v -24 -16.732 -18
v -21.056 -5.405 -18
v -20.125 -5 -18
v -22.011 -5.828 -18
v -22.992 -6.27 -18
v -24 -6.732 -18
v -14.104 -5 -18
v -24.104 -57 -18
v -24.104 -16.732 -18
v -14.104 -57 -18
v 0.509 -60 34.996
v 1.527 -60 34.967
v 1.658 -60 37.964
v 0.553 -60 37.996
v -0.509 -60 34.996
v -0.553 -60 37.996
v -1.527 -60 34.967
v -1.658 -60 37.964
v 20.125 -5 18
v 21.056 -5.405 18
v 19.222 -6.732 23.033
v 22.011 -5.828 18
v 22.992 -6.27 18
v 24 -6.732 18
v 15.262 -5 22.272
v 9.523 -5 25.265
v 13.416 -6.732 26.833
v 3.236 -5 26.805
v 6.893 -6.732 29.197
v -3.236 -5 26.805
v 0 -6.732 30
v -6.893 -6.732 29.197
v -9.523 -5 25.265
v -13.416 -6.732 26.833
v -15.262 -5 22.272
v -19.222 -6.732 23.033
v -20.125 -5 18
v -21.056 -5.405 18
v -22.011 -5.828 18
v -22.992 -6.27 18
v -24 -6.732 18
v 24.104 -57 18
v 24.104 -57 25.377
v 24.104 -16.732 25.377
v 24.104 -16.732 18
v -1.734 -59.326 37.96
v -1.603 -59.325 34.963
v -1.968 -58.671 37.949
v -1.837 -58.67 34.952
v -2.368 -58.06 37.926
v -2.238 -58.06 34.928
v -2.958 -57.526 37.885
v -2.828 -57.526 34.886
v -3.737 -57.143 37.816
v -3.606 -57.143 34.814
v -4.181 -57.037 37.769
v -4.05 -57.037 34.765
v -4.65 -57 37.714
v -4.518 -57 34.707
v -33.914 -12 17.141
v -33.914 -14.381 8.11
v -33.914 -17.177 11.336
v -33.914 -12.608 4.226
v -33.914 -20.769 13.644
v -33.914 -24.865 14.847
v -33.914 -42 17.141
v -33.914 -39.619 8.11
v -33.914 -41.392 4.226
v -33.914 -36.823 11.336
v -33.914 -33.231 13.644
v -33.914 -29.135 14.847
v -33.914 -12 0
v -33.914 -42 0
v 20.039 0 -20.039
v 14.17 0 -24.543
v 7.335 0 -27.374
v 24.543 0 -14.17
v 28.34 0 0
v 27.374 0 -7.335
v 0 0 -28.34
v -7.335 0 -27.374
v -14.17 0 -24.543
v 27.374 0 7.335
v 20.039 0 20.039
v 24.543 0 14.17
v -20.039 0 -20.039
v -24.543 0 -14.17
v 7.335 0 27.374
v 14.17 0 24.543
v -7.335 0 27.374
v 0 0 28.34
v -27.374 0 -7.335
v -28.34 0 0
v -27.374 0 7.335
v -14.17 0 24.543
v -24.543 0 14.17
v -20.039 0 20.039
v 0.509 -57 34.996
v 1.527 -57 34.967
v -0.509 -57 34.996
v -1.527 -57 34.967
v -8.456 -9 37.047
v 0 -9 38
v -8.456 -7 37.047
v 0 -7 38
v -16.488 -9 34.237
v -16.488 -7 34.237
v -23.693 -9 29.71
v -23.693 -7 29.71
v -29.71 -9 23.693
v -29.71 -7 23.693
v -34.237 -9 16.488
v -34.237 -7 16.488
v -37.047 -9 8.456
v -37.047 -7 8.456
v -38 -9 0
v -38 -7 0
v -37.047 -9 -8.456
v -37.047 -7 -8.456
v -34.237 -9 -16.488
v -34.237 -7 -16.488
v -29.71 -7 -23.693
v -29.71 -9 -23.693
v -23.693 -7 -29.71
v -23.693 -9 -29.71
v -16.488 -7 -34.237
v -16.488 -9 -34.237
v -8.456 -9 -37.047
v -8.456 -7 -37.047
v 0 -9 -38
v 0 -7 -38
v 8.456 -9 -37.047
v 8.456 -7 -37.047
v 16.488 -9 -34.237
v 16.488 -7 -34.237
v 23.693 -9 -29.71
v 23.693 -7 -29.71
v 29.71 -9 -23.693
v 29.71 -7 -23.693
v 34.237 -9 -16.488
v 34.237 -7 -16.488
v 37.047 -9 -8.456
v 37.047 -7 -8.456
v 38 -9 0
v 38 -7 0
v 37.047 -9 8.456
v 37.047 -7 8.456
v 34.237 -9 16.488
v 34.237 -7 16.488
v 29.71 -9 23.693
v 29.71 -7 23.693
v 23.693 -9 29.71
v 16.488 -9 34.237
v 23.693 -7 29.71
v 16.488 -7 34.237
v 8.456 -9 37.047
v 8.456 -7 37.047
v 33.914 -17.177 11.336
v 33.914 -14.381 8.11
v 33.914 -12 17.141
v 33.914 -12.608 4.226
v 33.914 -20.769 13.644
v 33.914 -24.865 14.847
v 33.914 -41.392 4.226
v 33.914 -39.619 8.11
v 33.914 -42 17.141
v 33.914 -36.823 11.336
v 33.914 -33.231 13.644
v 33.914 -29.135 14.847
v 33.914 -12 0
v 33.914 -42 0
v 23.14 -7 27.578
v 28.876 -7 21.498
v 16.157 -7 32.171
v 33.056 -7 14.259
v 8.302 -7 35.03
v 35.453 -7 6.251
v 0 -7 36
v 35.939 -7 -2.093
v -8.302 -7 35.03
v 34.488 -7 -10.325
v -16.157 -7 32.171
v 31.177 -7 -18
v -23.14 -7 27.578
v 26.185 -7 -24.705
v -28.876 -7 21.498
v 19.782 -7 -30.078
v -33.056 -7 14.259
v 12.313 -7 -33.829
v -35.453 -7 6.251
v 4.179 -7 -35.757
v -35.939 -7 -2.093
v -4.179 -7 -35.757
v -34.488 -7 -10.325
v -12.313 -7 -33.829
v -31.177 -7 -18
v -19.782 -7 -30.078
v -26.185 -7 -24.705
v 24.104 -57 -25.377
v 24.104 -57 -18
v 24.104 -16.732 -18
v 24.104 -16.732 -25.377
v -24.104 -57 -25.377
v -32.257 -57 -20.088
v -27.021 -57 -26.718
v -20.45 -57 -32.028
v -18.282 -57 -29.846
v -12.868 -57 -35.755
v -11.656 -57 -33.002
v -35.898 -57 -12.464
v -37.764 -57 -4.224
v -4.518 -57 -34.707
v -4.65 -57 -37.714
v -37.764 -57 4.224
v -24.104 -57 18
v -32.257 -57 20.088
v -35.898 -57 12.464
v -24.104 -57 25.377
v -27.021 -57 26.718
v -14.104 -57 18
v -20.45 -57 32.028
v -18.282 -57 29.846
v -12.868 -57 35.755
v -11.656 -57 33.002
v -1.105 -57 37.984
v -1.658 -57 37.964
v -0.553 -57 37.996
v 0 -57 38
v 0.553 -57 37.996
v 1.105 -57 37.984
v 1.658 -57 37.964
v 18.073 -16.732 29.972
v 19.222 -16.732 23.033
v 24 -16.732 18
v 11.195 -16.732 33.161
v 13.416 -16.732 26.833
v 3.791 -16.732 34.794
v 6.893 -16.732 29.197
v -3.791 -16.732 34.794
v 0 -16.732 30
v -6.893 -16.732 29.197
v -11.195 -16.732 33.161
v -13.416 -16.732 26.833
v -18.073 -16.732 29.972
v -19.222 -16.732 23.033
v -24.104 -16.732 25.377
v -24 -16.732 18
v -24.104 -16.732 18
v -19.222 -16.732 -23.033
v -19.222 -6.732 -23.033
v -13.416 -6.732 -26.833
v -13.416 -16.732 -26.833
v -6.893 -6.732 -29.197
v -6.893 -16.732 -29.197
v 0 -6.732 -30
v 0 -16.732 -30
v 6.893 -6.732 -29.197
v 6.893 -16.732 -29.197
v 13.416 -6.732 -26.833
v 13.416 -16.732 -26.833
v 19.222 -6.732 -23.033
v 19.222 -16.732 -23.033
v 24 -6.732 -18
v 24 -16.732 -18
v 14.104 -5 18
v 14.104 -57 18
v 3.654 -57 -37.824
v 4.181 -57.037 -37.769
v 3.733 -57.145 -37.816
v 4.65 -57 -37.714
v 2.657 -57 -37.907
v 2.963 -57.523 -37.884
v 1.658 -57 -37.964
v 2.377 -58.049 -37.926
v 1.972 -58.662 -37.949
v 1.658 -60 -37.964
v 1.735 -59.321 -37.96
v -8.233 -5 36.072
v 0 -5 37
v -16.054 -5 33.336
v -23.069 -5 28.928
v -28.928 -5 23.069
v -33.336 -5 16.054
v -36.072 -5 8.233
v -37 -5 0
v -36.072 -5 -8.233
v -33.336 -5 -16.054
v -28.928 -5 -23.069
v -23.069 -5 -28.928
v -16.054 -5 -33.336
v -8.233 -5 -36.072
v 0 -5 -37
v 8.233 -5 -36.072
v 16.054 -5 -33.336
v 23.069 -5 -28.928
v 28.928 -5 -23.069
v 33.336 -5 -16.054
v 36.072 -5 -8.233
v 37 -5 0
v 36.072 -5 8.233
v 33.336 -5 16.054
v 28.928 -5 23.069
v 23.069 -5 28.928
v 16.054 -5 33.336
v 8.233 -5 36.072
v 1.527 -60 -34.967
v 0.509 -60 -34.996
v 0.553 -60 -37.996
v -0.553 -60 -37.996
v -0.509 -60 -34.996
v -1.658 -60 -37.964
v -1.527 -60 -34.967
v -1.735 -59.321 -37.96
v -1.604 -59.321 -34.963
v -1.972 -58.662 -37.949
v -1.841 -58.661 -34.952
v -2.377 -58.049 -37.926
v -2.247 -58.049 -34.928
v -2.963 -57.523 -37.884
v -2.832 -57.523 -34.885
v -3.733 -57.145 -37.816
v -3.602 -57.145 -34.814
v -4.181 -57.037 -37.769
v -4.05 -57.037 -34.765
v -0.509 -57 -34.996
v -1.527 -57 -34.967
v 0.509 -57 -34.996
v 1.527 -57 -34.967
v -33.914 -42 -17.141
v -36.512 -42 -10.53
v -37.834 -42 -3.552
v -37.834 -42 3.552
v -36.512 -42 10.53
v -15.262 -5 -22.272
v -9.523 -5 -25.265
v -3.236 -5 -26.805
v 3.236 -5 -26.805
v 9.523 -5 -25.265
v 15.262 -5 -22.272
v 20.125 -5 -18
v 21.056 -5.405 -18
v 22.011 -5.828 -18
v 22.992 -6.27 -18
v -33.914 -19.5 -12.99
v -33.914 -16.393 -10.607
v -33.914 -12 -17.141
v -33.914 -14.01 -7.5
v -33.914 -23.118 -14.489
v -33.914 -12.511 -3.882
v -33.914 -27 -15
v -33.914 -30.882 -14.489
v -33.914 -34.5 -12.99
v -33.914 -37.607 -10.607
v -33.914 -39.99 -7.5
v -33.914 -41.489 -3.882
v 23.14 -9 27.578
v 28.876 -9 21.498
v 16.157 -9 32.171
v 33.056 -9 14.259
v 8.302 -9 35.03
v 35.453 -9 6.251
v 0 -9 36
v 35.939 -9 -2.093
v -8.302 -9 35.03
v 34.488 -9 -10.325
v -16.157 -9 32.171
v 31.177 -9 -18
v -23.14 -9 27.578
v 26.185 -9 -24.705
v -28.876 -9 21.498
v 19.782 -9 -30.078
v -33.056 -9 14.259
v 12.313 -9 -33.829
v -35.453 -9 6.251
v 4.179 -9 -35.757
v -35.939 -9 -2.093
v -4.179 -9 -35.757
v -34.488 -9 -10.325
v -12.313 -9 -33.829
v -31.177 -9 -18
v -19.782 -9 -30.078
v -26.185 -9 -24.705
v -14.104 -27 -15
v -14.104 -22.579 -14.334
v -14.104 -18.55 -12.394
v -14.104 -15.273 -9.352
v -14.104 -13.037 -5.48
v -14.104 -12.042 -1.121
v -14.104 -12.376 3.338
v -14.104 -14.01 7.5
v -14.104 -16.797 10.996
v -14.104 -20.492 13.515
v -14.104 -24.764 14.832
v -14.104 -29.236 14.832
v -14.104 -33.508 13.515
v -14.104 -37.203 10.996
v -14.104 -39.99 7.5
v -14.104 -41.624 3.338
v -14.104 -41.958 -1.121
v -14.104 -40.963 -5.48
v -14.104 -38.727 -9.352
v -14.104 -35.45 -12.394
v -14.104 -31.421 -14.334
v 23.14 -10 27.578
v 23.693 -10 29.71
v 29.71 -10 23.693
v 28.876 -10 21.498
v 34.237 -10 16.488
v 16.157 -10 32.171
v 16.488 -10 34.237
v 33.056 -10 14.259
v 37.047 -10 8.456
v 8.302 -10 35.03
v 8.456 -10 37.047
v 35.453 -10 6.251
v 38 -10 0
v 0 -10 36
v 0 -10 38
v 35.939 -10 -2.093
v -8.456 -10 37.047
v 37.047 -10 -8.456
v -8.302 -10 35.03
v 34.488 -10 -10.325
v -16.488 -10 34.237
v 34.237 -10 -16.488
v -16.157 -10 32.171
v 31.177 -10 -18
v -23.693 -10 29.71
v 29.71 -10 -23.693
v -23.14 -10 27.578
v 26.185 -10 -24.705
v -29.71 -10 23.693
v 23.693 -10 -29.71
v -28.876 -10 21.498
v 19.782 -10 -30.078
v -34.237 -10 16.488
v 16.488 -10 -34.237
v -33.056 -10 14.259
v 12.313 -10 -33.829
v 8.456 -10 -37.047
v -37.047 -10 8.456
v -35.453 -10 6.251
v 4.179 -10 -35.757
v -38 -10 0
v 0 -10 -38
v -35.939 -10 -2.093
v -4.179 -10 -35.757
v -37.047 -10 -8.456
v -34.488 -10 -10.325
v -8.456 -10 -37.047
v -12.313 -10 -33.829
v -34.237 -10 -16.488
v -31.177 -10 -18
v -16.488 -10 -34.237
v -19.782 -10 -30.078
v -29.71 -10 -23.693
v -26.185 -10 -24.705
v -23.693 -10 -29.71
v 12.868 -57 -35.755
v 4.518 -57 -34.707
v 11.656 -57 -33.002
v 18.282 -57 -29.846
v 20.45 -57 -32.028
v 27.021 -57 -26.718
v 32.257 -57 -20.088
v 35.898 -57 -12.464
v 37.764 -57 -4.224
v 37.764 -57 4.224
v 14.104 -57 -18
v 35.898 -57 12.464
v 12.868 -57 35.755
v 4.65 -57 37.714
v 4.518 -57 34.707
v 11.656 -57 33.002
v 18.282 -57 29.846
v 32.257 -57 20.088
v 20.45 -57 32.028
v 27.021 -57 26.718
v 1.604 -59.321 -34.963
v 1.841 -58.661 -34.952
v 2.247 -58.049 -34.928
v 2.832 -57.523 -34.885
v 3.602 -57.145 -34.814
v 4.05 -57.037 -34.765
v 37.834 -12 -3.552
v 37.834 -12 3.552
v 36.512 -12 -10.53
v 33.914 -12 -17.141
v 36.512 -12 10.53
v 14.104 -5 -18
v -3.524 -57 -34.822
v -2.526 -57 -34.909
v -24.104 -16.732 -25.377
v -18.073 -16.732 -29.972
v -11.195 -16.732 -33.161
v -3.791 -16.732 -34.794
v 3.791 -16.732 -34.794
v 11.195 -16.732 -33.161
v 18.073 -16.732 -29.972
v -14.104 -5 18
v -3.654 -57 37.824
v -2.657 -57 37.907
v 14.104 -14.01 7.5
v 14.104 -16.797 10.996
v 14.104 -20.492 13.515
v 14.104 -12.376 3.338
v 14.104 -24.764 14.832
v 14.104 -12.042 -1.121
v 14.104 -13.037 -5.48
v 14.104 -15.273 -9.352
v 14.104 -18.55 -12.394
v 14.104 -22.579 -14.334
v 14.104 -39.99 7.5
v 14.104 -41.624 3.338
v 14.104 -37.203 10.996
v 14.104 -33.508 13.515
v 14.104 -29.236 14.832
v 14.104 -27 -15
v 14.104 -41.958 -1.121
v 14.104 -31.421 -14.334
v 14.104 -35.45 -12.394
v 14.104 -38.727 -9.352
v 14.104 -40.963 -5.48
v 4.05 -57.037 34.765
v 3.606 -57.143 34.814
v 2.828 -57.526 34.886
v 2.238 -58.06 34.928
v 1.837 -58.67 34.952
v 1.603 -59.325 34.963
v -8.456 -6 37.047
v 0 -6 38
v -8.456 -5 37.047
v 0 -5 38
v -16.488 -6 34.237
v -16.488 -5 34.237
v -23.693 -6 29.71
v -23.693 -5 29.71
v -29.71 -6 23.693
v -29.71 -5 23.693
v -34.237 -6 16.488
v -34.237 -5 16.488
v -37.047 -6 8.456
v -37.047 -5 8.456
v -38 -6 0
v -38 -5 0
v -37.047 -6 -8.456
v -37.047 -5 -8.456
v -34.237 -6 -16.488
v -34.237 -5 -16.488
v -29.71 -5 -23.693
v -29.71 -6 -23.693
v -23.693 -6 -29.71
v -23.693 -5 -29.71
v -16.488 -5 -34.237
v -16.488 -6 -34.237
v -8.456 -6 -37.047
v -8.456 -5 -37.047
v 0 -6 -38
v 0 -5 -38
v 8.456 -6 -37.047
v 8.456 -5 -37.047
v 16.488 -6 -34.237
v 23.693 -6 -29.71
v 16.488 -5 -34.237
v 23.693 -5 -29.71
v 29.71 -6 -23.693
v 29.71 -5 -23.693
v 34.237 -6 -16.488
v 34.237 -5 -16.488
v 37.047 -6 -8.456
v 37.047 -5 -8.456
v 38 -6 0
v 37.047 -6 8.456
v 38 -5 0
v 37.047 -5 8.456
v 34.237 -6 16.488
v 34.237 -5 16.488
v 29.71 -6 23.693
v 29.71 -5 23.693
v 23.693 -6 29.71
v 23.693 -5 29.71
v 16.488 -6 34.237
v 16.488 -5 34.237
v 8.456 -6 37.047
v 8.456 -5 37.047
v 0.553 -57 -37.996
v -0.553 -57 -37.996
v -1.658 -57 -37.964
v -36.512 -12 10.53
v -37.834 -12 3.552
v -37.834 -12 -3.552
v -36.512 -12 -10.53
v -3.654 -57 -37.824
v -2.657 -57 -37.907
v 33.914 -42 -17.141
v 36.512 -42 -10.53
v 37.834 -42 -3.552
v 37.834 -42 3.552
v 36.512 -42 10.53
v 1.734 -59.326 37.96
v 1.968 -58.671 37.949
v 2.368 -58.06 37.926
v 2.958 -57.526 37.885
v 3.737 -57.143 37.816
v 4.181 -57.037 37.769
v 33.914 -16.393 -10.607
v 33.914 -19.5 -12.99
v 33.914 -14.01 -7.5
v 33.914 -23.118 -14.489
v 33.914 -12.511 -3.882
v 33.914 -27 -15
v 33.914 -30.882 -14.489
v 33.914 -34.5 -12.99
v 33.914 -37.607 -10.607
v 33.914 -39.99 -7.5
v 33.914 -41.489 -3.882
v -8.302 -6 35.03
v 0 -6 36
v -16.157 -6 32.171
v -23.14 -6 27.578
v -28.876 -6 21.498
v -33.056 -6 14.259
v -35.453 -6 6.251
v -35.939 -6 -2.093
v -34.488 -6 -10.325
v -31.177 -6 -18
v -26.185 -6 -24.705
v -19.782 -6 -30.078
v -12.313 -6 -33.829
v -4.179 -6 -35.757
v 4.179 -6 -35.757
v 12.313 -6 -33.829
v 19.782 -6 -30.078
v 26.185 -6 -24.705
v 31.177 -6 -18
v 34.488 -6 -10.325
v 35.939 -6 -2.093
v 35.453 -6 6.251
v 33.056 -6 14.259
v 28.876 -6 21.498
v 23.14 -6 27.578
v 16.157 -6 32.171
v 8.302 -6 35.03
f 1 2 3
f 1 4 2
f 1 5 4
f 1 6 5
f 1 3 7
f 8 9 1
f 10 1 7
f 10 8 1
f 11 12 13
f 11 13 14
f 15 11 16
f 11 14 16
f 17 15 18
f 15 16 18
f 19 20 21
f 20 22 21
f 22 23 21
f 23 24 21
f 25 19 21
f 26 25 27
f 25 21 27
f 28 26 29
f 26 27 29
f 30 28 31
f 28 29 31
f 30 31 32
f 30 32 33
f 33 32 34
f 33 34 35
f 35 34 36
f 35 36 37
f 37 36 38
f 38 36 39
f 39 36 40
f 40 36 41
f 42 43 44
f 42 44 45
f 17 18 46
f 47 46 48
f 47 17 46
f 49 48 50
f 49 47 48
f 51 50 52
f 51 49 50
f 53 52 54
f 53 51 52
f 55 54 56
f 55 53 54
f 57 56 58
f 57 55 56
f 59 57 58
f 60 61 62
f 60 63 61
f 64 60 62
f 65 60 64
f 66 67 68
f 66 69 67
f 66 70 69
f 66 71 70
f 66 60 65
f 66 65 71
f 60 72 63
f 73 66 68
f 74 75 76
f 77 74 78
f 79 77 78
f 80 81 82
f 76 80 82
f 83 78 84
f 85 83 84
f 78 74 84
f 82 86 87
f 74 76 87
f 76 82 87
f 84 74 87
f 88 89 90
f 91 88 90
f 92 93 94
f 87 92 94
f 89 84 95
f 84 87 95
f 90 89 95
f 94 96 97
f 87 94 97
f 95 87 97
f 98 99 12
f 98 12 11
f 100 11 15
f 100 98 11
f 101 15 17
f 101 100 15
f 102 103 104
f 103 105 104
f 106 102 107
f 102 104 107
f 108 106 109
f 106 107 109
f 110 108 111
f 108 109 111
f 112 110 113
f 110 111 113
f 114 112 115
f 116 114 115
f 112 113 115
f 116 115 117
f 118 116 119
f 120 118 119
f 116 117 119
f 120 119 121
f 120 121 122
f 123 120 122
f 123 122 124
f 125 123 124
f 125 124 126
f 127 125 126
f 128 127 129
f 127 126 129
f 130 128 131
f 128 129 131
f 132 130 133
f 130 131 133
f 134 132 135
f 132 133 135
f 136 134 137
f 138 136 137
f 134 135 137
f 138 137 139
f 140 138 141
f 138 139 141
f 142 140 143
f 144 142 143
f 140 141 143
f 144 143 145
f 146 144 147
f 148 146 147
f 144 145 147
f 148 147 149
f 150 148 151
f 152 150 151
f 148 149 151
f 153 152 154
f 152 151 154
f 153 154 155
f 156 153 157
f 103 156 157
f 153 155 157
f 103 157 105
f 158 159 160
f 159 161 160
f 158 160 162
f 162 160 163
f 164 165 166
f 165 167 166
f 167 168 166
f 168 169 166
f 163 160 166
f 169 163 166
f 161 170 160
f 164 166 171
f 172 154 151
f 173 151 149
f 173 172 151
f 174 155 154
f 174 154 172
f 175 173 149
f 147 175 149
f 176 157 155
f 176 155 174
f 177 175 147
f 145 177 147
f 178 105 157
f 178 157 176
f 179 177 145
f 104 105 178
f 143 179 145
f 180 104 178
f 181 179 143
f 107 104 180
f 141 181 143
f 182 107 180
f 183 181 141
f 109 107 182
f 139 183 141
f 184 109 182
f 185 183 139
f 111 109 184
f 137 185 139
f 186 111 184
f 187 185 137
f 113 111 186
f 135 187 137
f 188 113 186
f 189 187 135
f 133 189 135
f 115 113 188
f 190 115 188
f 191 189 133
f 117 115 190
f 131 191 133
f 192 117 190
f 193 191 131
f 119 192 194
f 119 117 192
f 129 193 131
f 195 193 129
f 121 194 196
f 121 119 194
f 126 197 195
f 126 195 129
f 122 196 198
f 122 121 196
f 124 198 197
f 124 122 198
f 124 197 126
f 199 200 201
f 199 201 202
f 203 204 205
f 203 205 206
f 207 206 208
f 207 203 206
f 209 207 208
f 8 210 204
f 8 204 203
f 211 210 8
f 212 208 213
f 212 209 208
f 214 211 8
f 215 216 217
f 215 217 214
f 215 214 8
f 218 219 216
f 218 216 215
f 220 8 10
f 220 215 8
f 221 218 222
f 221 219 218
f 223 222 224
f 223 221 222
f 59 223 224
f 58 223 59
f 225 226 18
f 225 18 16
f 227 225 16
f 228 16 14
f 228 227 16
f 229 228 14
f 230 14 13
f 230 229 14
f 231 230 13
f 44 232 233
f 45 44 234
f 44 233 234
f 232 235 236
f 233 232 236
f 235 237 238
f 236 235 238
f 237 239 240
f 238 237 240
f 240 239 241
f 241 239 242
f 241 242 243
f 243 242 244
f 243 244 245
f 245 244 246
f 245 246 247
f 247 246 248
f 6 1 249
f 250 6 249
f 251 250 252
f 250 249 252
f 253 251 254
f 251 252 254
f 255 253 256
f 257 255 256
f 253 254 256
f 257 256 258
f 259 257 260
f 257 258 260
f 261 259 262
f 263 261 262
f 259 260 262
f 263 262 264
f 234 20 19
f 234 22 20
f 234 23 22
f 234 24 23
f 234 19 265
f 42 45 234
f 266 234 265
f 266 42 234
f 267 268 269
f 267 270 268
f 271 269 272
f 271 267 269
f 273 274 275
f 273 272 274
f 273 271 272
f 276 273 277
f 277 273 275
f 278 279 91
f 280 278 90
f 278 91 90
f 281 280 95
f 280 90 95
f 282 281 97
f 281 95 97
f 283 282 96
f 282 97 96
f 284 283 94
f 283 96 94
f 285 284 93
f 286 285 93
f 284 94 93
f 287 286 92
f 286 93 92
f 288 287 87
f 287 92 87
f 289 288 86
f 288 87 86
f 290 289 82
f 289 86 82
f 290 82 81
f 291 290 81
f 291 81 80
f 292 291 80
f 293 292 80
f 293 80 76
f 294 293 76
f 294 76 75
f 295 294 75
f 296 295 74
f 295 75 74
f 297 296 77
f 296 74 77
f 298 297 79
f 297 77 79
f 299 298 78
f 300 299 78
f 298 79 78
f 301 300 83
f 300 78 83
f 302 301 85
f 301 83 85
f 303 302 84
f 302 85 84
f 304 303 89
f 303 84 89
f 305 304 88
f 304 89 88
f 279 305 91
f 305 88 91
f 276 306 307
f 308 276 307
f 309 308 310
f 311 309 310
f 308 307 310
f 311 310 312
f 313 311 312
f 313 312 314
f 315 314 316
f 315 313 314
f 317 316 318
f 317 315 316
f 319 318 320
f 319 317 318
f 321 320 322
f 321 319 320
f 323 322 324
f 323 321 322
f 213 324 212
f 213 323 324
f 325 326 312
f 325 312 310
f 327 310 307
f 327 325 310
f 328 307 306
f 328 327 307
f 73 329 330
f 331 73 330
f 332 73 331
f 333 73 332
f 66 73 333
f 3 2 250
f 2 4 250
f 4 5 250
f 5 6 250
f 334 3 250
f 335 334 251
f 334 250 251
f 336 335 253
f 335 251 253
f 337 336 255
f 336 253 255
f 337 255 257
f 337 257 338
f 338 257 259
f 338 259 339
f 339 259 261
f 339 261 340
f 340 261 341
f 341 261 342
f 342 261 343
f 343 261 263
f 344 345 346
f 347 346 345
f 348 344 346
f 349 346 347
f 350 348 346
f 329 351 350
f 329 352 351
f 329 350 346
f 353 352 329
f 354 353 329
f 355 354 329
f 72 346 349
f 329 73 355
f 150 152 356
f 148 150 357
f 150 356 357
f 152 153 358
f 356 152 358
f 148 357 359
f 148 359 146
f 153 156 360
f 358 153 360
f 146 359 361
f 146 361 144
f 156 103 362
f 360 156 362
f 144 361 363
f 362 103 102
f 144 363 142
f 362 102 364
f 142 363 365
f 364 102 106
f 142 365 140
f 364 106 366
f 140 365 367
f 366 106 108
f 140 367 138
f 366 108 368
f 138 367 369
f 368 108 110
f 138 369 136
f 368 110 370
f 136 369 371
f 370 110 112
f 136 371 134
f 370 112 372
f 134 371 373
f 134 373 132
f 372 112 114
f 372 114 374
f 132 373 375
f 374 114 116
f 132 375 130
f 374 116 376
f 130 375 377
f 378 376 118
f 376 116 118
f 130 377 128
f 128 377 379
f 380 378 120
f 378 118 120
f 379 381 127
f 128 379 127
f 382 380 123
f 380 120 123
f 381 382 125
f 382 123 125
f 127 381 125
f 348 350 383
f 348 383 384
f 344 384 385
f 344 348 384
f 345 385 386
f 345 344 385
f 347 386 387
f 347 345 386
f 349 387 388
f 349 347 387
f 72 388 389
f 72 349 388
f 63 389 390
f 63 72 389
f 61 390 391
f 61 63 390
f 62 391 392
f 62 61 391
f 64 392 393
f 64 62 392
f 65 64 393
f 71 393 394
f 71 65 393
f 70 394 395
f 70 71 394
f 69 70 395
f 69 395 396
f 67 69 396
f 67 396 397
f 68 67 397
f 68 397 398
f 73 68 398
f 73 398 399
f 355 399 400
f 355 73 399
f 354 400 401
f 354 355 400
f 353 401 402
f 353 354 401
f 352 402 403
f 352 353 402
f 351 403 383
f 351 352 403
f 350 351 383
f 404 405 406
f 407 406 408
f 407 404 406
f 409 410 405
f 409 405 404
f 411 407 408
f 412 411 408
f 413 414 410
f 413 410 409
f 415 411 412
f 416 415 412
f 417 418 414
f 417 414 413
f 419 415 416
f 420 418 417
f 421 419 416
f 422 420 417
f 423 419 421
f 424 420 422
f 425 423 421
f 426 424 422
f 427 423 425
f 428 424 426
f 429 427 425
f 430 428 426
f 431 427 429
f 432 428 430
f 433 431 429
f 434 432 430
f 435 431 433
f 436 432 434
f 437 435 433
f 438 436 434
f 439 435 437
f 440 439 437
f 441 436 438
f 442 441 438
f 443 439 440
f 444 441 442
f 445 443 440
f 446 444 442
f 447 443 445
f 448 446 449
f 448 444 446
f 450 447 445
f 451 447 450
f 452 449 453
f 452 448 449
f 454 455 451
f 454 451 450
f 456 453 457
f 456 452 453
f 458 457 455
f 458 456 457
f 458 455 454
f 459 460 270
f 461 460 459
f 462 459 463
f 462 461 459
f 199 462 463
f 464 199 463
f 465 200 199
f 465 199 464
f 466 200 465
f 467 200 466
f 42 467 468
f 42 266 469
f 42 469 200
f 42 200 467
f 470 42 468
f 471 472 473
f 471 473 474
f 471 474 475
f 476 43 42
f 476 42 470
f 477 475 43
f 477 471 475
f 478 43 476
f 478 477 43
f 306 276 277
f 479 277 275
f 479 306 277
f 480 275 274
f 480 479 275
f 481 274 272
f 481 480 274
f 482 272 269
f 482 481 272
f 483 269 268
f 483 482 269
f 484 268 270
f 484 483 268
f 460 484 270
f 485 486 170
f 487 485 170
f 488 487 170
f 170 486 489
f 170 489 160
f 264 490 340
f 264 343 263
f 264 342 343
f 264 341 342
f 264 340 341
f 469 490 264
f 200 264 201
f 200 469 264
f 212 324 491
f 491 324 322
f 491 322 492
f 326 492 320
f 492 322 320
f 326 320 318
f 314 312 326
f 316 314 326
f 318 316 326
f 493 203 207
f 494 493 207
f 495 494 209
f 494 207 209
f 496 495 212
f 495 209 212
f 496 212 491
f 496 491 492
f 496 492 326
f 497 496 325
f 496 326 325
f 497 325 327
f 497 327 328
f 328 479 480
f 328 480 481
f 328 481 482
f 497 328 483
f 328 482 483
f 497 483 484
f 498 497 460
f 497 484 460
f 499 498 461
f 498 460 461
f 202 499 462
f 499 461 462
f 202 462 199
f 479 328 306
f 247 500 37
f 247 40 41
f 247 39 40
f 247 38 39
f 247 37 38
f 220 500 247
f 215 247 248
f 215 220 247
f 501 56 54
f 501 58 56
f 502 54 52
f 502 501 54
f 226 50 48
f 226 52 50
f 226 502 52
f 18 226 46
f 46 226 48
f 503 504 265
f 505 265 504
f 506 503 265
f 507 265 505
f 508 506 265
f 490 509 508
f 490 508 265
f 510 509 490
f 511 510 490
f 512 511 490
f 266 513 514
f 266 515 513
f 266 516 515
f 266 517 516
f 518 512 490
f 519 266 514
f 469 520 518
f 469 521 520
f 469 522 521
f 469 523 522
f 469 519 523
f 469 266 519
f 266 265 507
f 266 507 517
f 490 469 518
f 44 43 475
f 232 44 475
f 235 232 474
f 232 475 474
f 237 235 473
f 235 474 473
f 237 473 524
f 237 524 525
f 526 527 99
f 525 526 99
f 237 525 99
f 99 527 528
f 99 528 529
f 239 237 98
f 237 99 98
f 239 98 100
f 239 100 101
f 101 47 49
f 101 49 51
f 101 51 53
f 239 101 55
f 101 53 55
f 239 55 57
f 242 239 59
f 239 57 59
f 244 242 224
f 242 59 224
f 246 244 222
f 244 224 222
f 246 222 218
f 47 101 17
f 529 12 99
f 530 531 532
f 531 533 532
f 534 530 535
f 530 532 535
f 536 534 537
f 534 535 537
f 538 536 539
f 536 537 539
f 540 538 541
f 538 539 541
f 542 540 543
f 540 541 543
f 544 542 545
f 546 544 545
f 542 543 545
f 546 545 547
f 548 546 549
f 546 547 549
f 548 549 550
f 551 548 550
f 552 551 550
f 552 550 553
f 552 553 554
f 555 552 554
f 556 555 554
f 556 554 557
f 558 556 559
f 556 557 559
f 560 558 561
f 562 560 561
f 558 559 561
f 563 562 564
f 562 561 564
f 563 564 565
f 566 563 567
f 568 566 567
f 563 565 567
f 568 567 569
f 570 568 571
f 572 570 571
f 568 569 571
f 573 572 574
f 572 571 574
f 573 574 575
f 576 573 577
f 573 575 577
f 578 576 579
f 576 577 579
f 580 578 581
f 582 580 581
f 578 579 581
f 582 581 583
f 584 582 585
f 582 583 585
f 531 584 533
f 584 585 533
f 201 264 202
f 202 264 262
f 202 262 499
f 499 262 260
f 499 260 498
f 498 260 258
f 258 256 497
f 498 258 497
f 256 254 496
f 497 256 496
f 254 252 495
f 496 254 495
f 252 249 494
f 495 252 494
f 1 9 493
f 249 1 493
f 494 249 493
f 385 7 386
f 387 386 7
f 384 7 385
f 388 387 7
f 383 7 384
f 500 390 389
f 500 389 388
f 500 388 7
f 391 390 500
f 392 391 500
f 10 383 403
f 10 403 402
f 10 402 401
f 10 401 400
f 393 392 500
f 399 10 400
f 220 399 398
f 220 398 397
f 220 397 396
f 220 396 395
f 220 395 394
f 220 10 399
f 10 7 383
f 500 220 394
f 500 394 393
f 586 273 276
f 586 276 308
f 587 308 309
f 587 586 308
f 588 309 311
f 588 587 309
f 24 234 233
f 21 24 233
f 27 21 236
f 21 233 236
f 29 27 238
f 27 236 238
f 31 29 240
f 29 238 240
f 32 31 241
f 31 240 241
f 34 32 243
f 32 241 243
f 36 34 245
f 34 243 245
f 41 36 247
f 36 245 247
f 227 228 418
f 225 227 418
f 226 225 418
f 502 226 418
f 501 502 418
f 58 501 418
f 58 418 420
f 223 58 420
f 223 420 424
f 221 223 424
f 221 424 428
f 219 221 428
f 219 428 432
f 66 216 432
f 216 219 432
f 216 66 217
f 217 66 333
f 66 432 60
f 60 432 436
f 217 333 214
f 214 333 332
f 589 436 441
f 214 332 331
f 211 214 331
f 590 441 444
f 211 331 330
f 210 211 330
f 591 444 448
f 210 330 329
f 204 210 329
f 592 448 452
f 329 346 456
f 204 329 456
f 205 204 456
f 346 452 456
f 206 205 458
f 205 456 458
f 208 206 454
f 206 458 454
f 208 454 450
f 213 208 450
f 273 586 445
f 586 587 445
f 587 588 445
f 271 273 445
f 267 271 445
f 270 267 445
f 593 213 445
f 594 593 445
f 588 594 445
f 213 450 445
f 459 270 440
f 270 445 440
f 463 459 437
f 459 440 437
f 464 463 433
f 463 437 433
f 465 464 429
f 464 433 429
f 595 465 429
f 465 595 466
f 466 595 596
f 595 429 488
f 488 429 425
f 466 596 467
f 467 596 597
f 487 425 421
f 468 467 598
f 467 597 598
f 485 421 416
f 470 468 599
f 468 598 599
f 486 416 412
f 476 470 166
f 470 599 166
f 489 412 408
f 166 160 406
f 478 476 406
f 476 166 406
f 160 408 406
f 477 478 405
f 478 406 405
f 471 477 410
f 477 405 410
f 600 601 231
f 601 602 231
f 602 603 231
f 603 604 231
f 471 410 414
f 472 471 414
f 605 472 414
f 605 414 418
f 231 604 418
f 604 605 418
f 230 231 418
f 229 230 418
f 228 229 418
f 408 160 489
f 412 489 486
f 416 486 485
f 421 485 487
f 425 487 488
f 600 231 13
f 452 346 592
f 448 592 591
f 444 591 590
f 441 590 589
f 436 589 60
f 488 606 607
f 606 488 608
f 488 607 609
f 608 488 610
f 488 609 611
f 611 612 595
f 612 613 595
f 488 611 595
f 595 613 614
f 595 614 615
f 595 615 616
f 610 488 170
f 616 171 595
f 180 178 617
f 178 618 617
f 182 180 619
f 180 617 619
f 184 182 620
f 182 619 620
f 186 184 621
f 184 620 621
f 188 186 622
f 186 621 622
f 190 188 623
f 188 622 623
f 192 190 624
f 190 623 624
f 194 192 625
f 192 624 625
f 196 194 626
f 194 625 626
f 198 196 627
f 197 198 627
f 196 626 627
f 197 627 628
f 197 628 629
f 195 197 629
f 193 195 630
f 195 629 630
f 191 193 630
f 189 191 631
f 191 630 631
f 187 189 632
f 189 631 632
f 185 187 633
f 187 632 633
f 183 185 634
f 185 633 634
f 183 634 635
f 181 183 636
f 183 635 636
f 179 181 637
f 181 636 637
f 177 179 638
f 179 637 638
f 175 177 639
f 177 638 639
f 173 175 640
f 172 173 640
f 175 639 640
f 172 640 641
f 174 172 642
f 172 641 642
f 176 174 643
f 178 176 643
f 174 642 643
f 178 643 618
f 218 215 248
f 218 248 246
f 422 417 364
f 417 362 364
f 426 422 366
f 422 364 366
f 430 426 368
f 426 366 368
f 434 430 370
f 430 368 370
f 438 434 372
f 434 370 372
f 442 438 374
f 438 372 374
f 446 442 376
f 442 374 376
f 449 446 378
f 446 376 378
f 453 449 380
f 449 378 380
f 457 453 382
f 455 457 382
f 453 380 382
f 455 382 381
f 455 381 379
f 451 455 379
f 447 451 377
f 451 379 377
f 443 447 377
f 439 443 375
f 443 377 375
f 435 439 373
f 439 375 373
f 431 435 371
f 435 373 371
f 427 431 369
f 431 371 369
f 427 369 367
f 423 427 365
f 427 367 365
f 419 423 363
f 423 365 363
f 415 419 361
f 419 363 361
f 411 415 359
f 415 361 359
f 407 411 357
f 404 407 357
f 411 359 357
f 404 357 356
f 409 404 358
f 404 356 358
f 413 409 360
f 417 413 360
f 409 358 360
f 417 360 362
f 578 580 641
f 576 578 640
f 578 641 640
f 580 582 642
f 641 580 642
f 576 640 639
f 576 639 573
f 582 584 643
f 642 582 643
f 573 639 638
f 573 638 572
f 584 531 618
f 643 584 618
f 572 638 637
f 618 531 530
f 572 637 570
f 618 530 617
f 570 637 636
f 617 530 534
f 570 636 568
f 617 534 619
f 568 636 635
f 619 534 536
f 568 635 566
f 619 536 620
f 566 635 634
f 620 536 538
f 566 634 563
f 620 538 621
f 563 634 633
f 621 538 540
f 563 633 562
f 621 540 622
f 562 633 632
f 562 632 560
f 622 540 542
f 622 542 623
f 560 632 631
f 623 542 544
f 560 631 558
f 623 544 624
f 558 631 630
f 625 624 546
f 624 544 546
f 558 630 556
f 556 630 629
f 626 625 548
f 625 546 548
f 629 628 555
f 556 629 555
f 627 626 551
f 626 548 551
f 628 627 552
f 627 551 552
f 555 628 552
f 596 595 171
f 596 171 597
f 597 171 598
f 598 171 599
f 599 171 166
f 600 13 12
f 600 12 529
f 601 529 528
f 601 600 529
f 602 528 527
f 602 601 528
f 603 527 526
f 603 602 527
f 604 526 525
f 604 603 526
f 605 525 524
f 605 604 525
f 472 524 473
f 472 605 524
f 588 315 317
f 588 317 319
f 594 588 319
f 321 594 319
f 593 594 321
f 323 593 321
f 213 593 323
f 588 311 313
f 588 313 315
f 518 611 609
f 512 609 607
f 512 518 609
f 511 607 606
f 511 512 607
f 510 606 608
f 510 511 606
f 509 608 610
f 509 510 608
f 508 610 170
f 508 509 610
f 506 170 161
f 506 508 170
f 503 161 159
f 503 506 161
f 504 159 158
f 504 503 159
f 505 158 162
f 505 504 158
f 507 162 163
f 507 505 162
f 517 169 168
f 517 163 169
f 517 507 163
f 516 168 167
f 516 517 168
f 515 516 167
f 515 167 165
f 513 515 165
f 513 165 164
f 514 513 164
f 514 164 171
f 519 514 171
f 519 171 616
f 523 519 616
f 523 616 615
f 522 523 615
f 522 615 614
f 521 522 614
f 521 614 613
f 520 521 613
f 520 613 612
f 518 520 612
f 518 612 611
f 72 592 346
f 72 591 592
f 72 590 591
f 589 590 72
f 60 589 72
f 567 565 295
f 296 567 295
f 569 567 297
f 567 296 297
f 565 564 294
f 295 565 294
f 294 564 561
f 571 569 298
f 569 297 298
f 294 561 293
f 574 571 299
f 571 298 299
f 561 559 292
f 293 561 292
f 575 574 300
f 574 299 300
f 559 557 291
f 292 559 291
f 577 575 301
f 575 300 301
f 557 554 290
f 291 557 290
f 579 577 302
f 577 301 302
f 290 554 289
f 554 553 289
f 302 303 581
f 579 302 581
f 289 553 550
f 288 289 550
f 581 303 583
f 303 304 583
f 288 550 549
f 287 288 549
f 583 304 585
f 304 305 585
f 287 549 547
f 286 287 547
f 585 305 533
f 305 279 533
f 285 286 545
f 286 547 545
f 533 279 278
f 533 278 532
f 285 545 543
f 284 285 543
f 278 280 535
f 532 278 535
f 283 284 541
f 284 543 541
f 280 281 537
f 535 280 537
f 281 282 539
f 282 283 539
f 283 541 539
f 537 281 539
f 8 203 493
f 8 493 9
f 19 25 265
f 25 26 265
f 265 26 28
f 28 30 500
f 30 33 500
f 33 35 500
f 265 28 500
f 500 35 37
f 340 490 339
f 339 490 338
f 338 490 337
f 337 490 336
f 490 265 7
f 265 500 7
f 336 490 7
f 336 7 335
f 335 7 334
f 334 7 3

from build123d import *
from build123d.topology import SkipClean

# Parameters (mm, degrees)
BOSS_EXTRUDE1_REACH     = 80.339
CUT_EXTRUDE1_DEPTH      = 87.068697729
CUT_EXTRUDE1_DEPTH_BACK = 87.068697729
GUDGEON_HOLE_R          = 15
CUT_EXTRUDE2_DEPTH      = 103.318131503
RING_CS_W               = 2
RING_CS_H               = 1
BOSS_EXTRUDE2_DEPTH     = 3
FILLET1_R               = 3


with BuildPart() as part:
    # Piston CS → Revolve1 (revolve)
    with BuildSketch(Plane.XY, mode=Mode.PRIVATE) as revolve1_sk:
        Polygon((0, 0), (0, -5), (27, -5), (30, -6.732050808), (30, -16.732050808), (35, -16.732050808), (35, -57), (38, -57), (38, -5), (37, -5), (28.339745962, 0), align=None)
    revolve(revolve1_sk.sketch.rotate(Axis((0, 0, 0), (0, -1, 0)), 90), axis=Axis((0, 0, 0), (0, -1, 0)))

    # Sketch5 → Boss-Extrude1 (add, up to next)
    with BuildSketch(Plane.XZ.offset(57), mode=Mode.PRIVATE) as boss_extrude1_sk1:
        with BuildLine():
            Line((-24.103941586, -38), (-24.103941586, -18))
            Line((-24.103941586, -18), (-14.103941586, -18))
            Line((-14.103941586, -18), (-14.103941586, 18))
            Line((-14.103941586, 18), (-24.103941586, 18))
            Line((-24.103941586, 18), (-24.103941586, 38))
            ThreePointArc((-24.103941586, 38), (-45, 0), (-24.103941586, -38))
        make_face()
    boss_extrude1_tool1 = extrude(boss_extrude1_sk1.sketch, amount=-BOSS_EXTRUDE1_REACH, mode=Mode.PRIVATE) - part.part
    # Sketch5 → Boss-Extrude1 (add, up to next)
    with BuildSketch(Plane.XZ.offset(57), mode=Mode.PRIVATE) as boss_extrude1_sk2:
        with BuildLine():
            Line((24.103941586, 38), (24.103941586, 18))
            Line((24.103941586, 18), (14.103941586, 18))
            Line((14.103941586, 18), (14.103941586, -18))
            Line((14.103941586, -18), (24.103941586, -18))
            Line((24.103941586, -18), (24.103941586, -38))
            ThreePointArc((24.103941586, -38), (45, 0), (24.103941586, 38))
        make_face()
    boss_extrude1_tool2 = extrude(boss_extrude1_sk2.sketch, amount=-BOSS_EXTRUDE1_REACH, mode=Mode.PRIVATE) - part.part
    add(boss_extrude1_tool1.solids().sort_by_distance((-29.359208, -57, 0))[0])
    add(boss_extrude1_tool2.solids().sort_by_distance((29.359208, -57, 0))[0])

    # Gudgeon Hole → Cut-Extrude1 (cut, two sides: drawn at the far end of the back side and taken through both)
    with BuildSketch(Plane(origin=(-14.103941586, 0, 0), x_dir=(0, 0, -1), z_dir=(1, 0, 0)).offset(-CUT_EXTRUDE1_DEPTH_BACK)):
        with Locations((0, -27)):
            Circle(GUDGEON_HOLE_R)
    extrude(amount=CUT_EXTRUDE1_DEPTH + CUT_EXTRUDE1_DEPTH_BACK, mode=Mode.SUBTRACT)

    # Gudgeon Hole Cutouts → Cut-Extrude2 (cut, through all)
    with BuildSketch(Plane.XY.offset(38)):
        with BuildLine():
            Line((33.9141805, -12), (33.9141805, -42))
            Line((33.9141805, -42), (38, -42))
            add(Edge.make_bspline(
                [(38, -42), (32.078947368, -27), (38, -12)],
                knots=[0, 0, 0, 1, 1, 1], degree=2, weights=[0.023, 0.038, 0.053]))
            Line((38, -12), (33.9141805, -12))
        make_face()
        with BuildLine():
            Line((-38, -12), (-33.9141805, -12))
            Line((-33.9141805, -12), (-33.9141805, -42))
            Line((-33.9141805, -42), (-38, -42))
            add(Edge.make_bspline(
                [(-38, -12), (-32.078947368, -27), (-38, -42)],
                knots=[0, 0, 0, 1, 1, 1], degree=2, weights=[0.023, 0.038, 0.053]))
        make_face()
    extrude(amount=-CUT_EXTRUDE2_DEPTH, mode=Mode.SUBTRACT)

    # Ring CS → Cut-Revolve1 (revolve, cut)
    with BuildSketch(Plane.XY, mode=Mode.PRIVATE) as cut_revolve1_sk:
        with Locations((37, -6.5)):
            Rectangle(RING_CS_W, RING_CS_H)
        with Locations((37, -9.5)):
            Rectangle(RING_CS_W, RING_CS_H)
    revolve(cut_revolve1_sk.sketch.rotate(Axis((0, 0, 0), (0, -1, 0)), 90), axis=Axis((0, 0, 0), (0, -1, 0)), mode=Mode.SUBTRACT)

    # Sketch9 → Boss-Extrude2 (add)
    with SkipClean():  # the faces are left unmerged after this step: merging them gives an invalid solid
        with BuildSketch(Plane.XZ.offset(57)):
            with BuildLine():
                Line((-1.526678558, 34.966687755), (-1.65753672, 37.96383242))
                ThreePointArc((-1.65753672, 37.96383242), (0, 38), (1.65753672, 37.96383242))
                Line((1.65753672, 37.96383242), (1.526678558, 34.966687755))
                ThreePointArc((1.526678558, 34.966687755), (0, 35), (-1.526678558, 34.966687755))
            make_face()
            with BuildLine():
                Line((1.526678558, -34.966687755), (1.65753672, -37.96383242))
                ThreePointArc((1.65753672, -37.96383242), (0, -38), (-1.65753672, -37.96383242))
                Line((-1.65753672, -37.96383242), (-1.526678558, -34.966687755))
                ThreePointArc((-1.526678558, -34.966687755), (0, -35), (1.526678558, -34.966687755))
            make_face()
        extrude(amount=BOSS_EXTRUDE2_DEPTH)

    # Fillet1
    # the kernel refuses this fillet: 3 mm, written as the material it adds along each edge
    with BuildSketch(Plane(origin=(1.984682125, -57, 45.456694082), x_dir=(0.9990482215818575, 0, -0.04361938736534301), z_dir=(-0.043619387365343, 0, -0.9990482215818575))) as fillet1_piece_1_section:
        with BuildLine():
            CenterArc((FILLET1_R, FILLET1_R), FILLET1_R, 180, 90)
            Line((0, FILLET1_R), (0, 0))
            Line((0, 0), (FILLET1_R, 0))
        make_face()
    fillet1_piece_1 = extrude(amount=18, mode=Mode.PRIVATE)
    fillet1_piece_1 = fillet1_piece_1 & Plane(origin=(0, -57.679016135, 0), x_dir=(0, 0, 1), z_dir=(0, 1, 0)) * Cylinder(38, 49, mode=Mode.PRIVATE)
    fillet1_piece_1 = fillet1_piece_1 - Plane(origin=(0, -57.679016135, 0), x_dir=(0, 0, 1), z_dir=(0, -1, 0)) * Cylinder(35, 49, mode=Mode.PRIVATE)
    add(fillet1_piece_1)
    with BuildSketch(Plane(origin=(-1.199533153, -57, 27.473826094), x_dir=(-0.999048221581858, 0, -0.04361938736532912), z_dir=(-0.043619387365329124, 0, 0.9990482215818581))) as fillet1_piece_2_section:
        with BuildLine():
            CenterArc((FILLET1_R, FILLET1_R), FILLET1_R, 180, 90)
            Line((0, FILLET1_R), (0, 0))
            Line((0, 0), (FILLET1_R, 0))
        make_face()
    fillet1_piece_2 = extrude(amount=18, mode=Mode.PRIVATE)
    fillet1_piece_2 = fillet1_piece_2 & Plane(origin=(0, -57.679023016, 0), x_dir=(0, 0, 1), z_dir=(0, 1, 0)) * Cylinder(38, 48, mode=Mode.PRIVATE)
    fillet1_piece_2 = fillet1_piece_2 - Plane(origin=(0, -57.679023016, 0), x_dir=(0, 0, 1), z_dir=(0, -1, 0)) * Cylinder(35, 48, mode=Mode.PRIVATE)
    add(fillet1_piece_2)
    with BuildSketch(Plane(origin=(1.199533153, -57, -27.473826094), x_dir=(0.9990482215818575, 0, 0.043619387365343), z_dir=(0.043619387365343, 0, -0.9990482215818575))) as fillet1_piece_3_section:
        with BuildLine():
            CenterArc((FILLET1_R, FILLET1_R), FILLET1_R, 180, 90)
            Line((0, FILLET1_R), (0, 0))
            Line((0, 0), (FILLET1_R, 0))
        make_face()
    fillet1_piece_3 = extrude(amount=18, mode=Mode.PRIVATE)
    fillet1_piece_3 = fillet1_piece_3 & Plane(origin=(0, -57.679021067, 0), x_dir=(0, 0, 1), z_dir=(0, 1, 0)) * Cylinder(38, 49, mode=Mode.PRIVATE)
    fillet1_piece_3 = fillet1_piece_3 - Plane(origin=(0, -57.679021067, 0), x_dir=(0, 0, 1), z_dir=(0, -1, 0)) * Cylinder(35, 49, mode=Mode.PRIVATE)
    add(fillet1_piece_3)
    with BuildSketch(Plane(origin=(-1.984682125, -57, -45.456694082), x_dir=(-0.999048221581858, 0, 0.04361938736532913), z_dir=(0.043619387365329124, 0, 0.9990482215818581))) as fillet1_piece_4_section:
        with BuildLine():
            CenterArc((FILLET1_R, FILLET1_R), FILLET1_R, 180, 90)
            Line((0, FILLET1_R), (0, 0))
            Line((0, 0), (FILLET1_R, 0))
        make_face()
    fillet1_piece_4 = extrude(amount=18, mode=Mode.PRIVATE)
    fillet1_piece_4 = fillet1_piece_4 - Plane(origin=(0, -57.679020805, 0), x_dir=(0, 0, 1), z_dir=(0, -1, 0)) * Cylinder(35, 48, mode=Mode.PRIVATE)
    fillet1_piece_4 = fillet1_piece_4 & Plane(origin=(0, -57.679020805, 0), x_dir=(0, 0, 1), z_dir=(0, 1, 0)) * Cylinder(38, 48, mode=Mode.PRIVATE)
    add(fillet1_piece_4)


solid = part.part
